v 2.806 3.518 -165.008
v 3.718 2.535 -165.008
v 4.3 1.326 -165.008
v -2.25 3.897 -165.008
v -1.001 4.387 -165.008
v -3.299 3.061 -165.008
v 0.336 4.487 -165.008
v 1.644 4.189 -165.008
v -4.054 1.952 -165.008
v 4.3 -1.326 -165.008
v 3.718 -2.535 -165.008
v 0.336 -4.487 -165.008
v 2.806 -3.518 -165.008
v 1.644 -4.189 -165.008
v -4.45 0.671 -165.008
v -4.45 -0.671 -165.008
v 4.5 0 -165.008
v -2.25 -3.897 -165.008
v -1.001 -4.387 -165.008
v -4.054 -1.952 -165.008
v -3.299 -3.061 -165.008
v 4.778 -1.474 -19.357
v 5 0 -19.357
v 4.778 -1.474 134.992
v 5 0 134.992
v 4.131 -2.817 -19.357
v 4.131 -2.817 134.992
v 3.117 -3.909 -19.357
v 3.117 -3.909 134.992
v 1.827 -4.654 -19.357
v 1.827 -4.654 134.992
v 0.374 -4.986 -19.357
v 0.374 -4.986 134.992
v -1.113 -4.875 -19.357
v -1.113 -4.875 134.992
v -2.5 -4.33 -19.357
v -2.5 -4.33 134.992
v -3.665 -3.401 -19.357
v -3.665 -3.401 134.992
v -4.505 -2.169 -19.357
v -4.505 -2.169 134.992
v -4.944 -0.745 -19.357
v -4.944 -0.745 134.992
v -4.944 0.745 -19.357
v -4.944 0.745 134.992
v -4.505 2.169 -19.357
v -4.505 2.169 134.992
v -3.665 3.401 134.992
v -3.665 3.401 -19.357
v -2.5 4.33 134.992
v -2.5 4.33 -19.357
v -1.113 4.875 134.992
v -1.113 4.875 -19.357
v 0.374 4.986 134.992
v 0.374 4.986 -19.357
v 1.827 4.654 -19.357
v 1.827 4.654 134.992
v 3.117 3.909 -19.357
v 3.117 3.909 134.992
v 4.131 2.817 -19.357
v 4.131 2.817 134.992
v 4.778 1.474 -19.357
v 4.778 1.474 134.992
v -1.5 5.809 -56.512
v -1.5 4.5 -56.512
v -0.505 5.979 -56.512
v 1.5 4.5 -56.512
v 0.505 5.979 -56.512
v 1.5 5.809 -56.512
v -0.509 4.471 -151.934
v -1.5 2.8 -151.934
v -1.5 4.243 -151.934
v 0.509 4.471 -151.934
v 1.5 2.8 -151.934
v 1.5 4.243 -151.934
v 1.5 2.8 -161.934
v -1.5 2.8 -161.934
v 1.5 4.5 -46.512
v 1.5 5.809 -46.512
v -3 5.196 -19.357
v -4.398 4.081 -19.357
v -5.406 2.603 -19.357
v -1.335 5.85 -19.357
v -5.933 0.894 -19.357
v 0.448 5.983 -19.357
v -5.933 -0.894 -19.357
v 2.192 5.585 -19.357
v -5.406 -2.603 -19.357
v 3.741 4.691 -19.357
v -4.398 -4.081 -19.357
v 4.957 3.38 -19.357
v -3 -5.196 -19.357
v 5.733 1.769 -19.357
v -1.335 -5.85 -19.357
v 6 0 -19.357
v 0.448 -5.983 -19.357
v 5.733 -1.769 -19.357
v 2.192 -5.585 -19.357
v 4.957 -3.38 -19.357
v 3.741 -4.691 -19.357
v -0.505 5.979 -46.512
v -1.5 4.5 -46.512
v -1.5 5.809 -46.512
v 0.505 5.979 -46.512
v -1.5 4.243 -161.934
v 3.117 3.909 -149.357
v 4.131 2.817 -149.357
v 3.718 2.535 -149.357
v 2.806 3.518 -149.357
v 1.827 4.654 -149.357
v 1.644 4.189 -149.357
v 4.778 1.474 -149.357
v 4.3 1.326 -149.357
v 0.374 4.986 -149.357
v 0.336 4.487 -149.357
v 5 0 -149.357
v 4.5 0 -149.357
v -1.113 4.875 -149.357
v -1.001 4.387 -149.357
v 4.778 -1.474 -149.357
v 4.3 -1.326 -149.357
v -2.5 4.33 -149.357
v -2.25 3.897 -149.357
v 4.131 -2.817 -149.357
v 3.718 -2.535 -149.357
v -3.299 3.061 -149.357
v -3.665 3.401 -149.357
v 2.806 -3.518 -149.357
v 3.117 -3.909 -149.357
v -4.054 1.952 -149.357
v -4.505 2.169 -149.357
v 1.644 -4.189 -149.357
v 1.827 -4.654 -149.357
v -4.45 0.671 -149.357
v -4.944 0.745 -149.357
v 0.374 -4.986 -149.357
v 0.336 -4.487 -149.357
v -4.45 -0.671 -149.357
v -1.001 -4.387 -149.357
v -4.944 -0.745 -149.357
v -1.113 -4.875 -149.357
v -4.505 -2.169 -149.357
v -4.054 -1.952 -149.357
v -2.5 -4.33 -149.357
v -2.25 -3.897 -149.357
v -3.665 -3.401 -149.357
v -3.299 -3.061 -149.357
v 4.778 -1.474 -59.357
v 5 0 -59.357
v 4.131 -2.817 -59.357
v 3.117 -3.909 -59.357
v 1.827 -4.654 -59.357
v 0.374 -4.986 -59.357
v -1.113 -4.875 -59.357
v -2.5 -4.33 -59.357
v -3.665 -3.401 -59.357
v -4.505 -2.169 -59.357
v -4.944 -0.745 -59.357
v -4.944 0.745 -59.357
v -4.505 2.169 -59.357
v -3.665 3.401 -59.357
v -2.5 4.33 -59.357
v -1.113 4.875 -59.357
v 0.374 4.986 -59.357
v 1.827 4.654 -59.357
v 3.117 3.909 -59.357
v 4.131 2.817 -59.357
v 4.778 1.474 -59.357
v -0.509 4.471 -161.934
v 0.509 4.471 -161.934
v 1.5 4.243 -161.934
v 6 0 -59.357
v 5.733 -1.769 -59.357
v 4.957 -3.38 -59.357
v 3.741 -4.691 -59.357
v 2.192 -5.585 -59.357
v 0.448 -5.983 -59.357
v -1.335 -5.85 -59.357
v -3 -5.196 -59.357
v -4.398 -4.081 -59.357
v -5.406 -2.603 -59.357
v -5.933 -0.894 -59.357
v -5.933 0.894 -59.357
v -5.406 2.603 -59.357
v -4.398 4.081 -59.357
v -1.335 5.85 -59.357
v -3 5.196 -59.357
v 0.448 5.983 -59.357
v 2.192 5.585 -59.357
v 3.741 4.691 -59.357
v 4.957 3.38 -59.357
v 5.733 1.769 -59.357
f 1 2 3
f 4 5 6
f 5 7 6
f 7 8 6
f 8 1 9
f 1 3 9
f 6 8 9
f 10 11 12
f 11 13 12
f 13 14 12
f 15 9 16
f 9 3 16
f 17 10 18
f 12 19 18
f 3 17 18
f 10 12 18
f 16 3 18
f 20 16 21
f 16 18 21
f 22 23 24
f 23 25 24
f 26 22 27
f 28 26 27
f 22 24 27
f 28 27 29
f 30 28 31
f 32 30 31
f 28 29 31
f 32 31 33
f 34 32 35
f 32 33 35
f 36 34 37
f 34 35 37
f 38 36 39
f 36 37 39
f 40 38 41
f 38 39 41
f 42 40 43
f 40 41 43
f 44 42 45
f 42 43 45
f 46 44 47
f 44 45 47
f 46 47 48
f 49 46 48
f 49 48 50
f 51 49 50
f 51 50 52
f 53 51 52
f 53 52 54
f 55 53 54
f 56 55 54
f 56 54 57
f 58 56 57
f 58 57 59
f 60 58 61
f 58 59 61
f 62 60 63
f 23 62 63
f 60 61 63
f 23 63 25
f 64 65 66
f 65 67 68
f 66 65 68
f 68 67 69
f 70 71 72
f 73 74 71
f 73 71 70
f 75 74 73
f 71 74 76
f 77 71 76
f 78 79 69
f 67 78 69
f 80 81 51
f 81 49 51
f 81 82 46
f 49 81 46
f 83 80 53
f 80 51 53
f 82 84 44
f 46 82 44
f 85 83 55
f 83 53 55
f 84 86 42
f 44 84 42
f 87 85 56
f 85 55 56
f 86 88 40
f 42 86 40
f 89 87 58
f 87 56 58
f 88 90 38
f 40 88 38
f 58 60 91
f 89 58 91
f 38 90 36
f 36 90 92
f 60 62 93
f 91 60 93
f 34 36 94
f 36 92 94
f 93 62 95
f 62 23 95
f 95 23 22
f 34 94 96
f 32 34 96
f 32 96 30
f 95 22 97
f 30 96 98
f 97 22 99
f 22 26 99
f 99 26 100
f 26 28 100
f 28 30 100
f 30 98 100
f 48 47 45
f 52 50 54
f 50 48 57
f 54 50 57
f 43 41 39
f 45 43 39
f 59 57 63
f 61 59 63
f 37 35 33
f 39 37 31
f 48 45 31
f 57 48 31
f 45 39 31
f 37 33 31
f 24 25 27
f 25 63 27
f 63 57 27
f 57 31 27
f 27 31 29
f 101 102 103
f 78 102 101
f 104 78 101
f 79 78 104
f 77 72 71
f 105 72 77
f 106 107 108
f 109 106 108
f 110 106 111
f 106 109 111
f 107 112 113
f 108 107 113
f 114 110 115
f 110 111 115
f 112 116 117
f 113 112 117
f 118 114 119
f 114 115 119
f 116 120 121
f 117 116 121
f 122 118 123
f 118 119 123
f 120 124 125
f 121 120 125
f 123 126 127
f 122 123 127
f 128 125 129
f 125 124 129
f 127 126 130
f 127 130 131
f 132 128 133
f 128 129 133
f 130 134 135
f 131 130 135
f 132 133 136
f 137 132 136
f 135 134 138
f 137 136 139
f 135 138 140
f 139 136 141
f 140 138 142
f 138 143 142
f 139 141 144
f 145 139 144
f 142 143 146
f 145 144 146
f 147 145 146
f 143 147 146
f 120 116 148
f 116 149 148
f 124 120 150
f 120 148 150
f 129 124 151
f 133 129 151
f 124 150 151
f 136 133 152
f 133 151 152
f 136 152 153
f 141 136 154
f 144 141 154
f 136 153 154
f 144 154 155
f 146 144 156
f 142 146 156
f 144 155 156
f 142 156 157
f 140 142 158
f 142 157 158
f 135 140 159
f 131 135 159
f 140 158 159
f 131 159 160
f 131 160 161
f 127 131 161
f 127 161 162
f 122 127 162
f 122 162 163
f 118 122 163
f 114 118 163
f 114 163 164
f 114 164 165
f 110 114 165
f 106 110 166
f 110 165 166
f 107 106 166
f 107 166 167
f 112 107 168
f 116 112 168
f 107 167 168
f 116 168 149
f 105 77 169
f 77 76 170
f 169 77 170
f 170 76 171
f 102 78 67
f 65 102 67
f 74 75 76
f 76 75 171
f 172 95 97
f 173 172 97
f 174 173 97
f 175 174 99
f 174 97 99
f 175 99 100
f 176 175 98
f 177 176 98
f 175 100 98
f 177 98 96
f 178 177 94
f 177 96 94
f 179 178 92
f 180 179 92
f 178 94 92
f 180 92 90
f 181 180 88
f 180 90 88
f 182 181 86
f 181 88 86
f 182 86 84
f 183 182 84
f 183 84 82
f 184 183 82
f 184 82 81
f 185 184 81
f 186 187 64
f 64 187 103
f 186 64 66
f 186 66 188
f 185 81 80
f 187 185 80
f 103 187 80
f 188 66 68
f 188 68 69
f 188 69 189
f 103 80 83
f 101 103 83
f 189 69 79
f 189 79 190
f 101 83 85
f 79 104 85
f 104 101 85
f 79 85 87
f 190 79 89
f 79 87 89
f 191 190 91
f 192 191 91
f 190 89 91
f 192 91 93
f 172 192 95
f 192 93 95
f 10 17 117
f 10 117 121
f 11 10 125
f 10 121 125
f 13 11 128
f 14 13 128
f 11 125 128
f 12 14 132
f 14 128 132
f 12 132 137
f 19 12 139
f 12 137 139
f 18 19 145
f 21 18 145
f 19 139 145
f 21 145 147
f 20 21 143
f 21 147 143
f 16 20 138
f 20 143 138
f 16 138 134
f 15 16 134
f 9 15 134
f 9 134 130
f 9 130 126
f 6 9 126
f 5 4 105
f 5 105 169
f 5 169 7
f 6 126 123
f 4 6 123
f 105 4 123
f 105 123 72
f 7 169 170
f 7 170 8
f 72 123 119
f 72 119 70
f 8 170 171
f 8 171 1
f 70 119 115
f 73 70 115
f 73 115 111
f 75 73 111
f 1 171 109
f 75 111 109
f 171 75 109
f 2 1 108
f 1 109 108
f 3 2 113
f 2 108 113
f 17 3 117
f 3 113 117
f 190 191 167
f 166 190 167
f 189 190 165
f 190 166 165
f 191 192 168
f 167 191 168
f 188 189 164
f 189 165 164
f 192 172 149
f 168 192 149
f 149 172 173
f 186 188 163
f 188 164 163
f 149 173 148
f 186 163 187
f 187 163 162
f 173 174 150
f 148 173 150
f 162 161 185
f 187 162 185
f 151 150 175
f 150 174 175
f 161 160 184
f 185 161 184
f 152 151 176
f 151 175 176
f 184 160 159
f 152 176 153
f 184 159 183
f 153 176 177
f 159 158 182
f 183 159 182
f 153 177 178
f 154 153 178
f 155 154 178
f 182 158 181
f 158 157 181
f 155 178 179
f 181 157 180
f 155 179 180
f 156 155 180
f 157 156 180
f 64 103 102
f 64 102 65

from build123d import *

# Parameters (mm, degrees)
SKETCH7_W          = 10
SKETCH7_H          = 1.5
CUT_EXTRUDE4_DEPTH = 1.5
SKETCH8_W          = 10
SKETCH8_H          = 1.7
CUT_EXTRUDE5_DEPTH = 1.5


with BuildPart() as part:
    # Sketch1 → Revolve1 (revolve)
    with BuildSketch(Plane(origin=(0, 0, 0), x_dir=(0, 0, -1), z_dir=(1, 0, 0)), mode=Mode.PRIVATE) as revolve1_sk:
        Polygon((-134.992104591, 0), (165.007895409, 0), (165.007895409, 4.5), (149.357384883, 4.5), (149.357384883, 5), (59.357384883, 5), (59.357384883, 6), (19.357384883, 6), (19.357384883, 5), (-134.992104591, 5), align=None)
    revolve(revolve1_sk.sketch.rotate(Axis((0, 0, 134.992104591), (0, 0, -1)), 90), axis=Axis((0, 0, 134.992104591), (0, 0, -1)))

    # Sketch7 → Cut-Extrude4 (cut, symmetric)
    with BuildSketch(Plane(origin=(0, 0, 0), x_dir=(0, 0, -1), z_dir=(1, 0, 0))):
        with Locations((51.512242661, 5.25)):
            Rectangle(SKETCH7_W, SKETCH7_H)
    extrude(amount=CUT_EXTRUDE4_DEPTH, both=True, mode=Mode.SUBTRACT)

    # Sketch8 → Cut-Extrude5 (cut, symmetric)
    with BuildSketch(Plane(origin=(0, 0, 0), x_dir=(0, 0, -1), z_dir=(1, 0, 0))):
        with Locations((156.934482796, 3.65)):
            Rectangle(SKETCH8_W, SKETCH8_H)
    extrude(amount=CUT_EXTRUDE5_DEPTH, both=True, mode=Mode.SUBTRACT)


solid = part.part
